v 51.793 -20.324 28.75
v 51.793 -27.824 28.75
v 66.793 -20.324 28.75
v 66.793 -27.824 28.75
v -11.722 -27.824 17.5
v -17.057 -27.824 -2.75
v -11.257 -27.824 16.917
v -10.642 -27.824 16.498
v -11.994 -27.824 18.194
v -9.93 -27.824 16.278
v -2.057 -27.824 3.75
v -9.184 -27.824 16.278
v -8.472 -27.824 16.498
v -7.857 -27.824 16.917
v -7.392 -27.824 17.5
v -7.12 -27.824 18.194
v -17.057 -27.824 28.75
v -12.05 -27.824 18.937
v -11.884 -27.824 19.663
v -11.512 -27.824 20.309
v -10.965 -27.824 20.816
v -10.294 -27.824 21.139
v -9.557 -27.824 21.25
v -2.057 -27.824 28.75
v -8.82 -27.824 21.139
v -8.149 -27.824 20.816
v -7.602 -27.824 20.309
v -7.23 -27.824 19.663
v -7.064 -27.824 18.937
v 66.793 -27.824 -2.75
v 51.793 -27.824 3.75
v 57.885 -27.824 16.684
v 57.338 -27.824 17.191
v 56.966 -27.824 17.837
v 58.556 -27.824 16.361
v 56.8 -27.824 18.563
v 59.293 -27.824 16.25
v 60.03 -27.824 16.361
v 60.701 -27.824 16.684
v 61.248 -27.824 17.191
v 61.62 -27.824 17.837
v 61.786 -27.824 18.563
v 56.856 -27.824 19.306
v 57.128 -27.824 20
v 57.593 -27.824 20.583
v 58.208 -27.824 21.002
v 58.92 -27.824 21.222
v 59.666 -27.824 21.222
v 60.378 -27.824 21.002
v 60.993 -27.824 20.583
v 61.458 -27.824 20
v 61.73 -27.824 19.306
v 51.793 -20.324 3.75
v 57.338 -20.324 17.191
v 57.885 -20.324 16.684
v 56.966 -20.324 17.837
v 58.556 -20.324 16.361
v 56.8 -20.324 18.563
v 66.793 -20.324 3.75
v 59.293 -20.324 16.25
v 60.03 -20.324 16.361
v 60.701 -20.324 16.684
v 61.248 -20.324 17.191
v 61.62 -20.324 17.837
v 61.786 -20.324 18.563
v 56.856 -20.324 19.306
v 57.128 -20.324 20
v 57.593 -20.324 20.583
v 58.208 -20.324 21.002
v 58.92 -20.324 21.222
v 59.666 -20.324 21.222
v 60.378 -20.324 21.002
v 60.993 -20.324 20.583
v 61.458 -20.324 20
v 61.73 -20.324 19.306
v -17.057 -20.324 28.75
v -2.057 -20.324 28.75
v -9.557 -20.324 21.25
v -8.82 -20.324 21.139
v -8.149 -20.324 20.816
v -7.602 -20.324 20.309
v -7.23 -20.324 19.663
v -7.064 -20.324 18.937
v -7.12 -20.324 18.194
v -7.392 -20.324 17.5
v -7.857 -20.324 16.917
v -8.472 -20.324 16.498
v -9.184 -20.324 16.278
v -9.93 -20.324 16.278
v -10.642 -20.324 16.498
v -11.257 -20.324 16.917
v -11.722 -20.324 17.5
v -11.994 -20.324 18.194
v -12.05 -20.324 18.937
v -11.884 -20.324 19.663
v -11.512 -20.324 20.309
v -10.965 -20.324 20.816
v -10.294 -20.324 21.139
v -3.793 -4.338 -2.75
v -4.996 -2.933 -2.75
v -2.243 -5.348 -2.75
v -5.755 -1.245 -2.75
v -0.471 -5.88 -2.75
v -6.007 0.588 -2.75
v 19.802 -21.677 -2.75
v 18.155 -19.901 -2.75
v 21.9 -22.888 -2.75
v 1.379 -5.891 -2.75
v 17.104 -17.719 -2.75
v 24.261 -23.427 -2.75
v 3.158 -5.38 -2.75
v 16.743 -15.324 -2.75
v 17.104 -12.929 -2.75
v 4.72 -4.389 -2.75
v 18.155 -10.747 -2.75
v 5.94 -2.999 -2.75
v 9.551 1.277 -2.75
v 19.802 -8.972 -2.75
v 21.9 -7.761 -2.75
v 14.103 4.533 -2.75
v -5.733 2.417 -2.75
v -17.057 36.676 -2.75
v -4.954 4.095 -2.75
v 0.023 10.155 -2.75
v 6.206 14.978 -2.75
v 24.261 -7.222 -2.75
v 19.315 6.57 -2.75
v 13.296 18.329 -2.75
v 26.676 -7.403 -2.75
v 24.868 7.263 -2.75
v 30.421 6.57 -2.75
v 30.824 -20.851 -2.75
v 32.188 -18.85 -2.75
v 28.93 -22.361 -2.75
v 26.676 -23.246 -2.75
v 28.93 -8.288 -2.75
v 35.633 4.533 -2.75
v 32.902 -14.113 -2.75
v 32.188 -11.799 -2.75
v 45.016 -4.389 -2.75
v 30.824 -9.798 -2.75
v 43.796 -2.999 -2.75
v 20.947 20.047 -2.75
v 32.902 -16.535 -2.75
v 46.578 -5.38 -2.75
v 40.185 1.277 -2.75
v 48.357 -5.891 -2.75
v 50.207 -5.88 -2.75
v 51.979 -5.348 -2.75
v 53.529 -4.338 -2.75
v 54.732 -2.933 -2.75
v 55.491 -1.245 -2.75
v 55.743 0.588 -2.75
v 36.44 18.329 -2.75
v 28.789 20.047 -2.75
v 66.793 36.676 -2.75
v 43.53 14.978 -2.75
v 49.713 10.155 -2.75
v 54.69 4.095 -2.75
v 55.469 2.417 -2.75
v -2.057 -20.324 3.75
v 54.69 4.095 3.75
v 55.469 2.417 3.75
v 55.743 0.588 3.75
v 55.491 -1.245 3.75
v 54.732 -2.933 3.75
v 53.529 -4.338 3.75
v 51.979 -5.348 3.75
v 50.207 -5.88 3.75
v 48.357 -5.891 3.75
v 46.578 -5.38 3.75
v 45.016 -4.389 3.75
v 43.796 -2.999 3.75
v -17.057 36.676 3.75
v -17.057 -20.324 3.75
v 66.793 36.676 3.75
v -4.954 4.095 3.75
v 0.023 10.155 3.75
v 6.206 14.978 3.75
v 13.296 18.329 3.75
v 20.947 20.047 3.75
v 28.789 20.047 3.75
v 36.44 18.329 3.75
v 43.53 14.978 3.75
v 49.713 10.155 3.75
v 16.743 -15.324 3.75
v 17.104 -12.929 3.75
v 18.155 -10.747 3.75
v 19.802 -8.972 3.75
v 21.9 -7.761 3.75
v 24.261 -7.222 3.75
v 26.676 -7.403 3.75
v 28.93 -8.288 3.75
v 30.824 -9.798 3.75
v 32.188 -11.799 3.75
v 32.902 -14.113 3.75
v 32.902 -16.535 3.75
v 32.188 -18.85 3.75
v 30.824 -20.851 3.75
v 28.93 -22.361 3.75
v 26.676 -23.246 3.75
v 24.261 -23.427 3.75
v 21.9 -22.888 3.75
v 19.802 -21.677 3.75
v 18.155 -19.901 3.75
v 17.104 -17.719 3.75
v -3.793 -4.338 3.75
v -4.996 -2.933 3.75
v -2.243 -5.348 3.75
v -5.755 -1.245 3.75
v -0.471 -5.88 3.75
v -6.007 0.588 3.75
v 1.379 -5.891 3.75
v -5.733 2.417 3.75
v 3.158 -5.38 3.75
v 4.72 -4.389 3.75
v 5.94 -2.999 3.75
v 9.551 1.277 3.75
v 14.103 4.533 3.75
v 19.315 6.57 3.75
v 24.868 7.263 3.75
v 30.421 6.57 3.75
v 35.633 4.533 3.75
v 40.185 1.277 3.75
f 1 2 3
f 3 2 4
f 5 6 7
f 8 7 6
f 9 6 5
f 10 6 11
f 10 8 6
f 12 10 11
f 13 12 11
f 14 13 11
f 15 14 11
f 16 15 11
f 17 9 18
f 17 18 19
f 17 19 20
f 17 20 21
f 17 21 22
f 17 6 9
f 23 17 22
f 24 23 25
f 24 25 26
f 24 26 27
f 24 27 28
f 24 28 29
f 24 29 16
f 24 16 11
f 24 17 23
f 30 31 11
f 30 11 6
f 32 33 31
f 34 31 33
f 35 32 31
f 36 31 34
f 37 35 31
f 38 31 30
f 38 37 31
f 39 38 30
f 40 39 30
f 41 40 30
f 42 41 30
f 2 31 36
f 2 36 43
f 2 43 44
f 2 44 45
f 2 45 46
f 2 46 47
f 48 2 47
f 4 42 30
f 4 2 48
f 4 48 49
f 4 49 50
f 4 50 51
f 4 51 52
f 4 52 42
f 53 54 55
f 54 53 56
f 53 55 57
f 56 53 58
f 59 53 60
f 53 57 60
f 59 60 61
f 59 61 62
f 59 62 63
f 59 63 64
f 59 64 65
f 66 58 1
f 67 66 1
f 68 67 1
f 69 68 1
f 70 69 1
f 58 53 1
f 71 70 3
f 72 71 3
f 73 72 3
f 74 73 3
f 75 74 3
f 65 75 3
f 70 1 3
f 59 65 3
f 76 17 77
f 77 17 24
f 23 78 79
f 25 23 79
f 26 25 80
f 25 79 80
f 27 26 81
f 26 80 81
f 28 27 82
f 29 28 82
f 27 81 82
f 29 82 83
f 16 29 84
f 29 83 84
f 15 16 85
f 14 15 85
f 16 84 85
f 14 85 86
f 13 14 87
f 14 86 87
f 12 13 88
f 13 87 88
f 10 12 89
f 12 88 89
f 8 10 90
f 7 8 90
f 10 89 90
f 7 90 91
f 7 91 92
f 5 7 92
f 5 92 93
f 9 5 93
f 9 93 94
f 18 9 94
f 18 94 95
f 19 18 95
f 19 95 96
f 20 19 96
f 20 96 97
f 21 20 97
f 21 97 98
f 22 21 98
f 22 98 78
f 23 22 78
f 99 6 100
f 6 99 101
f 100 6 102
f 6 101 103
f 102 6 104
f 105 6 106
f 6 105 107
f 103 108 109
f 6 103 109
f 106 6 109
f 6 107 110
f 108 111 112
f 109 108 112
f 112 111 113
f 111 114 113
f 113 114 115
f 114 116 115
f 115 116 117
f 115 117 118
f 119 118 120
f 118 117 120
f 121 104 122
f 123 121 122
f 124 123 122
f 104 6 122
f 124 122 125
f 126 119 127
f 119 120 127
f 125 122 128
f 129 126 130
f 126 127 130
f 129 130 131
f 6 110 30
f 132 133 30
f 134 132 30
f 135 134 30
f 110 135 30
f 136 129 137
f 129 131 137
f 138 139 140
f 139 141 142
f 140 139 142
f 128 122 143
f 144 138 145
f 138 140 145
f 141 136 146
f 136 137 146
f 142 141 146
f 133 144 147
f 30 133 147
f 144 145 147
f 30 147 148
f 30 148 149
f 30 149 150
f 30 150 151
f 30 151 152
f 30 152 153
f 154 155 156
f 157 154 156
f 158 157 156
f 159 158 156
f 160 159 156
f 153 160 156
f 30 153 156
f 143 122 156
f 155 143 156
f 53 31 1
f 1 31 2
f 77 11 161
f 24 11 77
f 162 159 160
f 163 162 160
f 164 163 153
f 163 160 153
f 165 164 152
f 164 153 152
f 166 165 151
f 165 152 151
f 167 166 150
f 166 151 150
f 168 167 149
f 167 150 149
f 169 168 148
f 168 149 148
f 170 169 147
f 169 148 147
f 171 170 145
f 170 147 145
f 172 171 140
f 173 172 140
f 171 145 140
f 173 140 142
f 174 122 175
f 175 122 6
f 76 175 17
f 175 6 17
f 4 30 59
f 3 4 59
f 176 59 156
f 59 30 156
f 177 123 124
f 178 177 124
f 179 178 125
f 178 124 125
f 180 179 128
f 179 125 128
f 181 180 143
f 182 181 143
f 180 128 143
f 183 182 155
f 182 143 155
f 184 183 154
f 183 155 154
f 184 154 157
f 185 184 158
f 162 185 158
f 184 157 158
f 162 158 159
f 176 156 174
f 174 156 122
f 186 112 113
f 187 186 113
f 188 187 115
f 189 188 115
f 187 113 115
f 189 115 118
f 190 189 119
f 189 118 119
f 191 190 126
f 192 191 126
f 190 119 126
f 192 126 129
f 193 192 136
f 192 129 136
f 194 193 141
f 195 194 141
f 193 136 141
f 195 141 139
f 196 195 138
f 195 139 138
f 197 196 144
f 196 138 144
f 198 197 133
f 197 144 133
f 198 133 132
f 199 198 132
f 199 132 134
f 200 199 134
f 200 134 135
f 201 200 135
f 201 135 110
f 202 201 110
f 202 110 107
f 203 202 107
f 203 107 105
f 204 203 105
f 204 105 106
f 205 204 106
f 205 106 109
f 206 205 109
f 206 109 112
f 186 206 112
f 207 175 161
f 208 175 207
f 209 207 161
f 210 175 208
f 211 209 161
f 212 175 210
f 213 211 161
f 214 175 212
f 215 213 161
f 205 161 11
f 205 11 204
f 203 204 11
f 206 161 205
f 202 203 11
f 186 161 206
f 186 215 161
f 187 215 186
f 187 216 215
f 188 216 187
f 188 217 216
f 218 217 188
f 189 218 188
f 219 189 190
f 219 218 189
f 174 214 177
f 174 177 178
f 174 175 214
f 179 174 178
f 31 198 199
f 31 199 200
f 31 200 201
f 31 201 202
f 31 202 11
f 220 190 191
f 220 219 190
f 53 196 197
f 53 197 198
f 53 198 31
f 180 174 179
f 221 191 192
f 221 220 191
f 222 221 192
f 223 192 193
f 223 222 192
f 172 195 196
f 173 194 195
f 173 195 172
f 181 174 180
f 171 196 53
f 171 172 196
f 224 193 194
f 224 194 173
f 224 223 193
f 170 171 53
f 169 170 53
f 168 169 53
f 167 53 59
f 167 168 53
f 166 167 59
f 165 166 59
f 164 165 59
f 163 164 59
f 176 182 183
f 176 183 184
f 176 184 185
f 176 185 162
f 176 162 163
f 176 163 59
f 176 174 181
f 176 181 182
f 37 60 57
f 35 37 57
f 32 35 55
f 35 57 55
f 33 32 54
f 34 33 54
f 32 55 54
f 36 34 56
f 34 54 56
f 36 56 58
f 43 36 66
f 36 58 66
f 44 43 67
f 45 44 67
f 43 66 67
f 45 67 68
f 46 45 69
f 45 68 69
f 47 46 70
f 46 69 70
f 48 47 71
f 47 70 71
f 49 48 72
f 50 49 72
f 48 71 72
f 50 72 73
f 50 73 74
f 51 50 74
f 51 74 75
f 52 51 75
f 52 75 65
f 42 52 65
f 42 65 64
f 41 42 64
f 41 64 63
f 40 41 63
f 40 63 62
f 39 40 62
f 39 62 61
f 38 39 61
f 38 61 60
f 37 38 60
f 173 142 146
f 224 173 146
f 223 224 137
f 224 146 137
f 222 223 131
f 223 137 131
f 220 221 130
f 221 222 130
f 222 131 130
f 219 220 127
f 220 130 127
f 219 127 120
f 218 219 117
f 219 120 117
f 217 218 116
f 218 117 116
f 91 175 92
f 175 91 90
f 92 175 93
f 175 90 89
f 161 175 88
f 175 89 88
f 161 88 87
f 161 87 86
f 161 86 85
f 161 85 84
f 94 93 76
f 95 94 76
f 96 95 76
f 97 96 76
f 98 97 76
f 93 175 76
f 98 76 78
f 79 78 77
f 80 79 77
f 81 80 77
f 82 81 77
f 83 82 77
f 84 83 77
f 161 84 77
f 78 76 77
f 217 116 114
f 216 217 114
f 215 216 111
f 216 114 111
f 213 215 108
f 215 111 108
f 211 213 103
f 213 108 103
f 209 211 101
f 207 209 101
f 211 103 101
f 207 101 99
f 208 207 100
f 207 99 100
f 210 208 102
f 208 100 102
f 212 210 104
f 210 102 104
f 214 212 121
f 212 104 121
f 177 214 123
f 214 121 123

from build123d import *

# Parameters (mm, degrees)
BOSS_EXTRU_1_DEPTH      = 1
ESQUISSE3_R             = 1.25
ENL_V_MAT_EXTRU_1_DEPTH = 3.45
ENL_V_MAT_EXTRU_2_DEPTH = 3.45
SCALE1_SCALE            = 6.5
CUT_EXTRUDE1_DEPTH      = 86.932976581
CUT_EXTRUDE1_DEPTH_BACK = 86.932976581
SKETCH2_W               = 15
SKETCH2_H               = 25
BOSS_EXTRUDE1_DEPTH     = 7.5
SKETCH3_R               = 2.5
CUT_EXTRUDE3_DEPTH      = 93.395152617


with BuildPart() as part:
    # Esquisse1 → Boss.-Extru.1 (new body)
    with BuildSketch(Plane.XY):
        Polygon((15.875, -11.8), (17.7, -11.8), (17.7, 0), (13.225, 0), (9.275, 0), (0, 0), (0, -11.8), (6.625, -11.8), (6.625, -13.9), (15.875, -13.9), align=None)
    extrude(amount=BOSS_EXTRU_1_DEPTH)

    # Esquisse3 → Enlèv. mat.-Extru.1 (cut)
    with BuildSketch(Plane(origin=(0, 0, 0), x_dir=(-1, 0, 0), z_dir=(0, 0, -1))):
        with Locations((-11.25, -8)):
            Circle(ESQUISSE3_R)
    extrude(amount=-ENL_V_MAT_EXTRU_1_DEPTH, mode=Mode.SUBTRACT)

    # Esquisse5 → Enlèv. mat.-Extru.2 (cut)
    with BuildSketch(Plane(origin=(0, 0, 0), x_dir=(-1, 0, 0), z_dir=(0, 0, -1))):
        with BuildLine():
            ThreePointArc((-6.662011173, -5.012361547), (-11.25, -2.525), (-15.837988827, -5.012361547))
            ThreePointArc((-15.837988827, -5.012361547), (-15.545687389, -6.396037763), (-14.162011173, -6.103736324))
            ThreePointArc((-14.162011173, -6.103736324), (-11.25, -4.525), (-8.337988827, -6.103736324))
            ThreePointArc((-8.337988827, -6.103736324), (-6.954312611, -6.396037763), (-6.662011173, -5.012361547))
        make_face()
    extrude(amount=-ENL_V_MAT_EXTRU_2_DEPTH, mode=Mode.SUBTRACT)


with BuildPart() as part_1:
    # Scale1: scaled about (8.774004249, -6.668318819, 0.5)
    add(part.part.scale(SCALE1_SCALE).moved(Location((-48.25702337, 36.675753504, -2.75))))

    # Sketch1 → Cut-Extrude1 (cut, two sides: drawn at the far end of the back side and taken through both)
    with BuildSketch(Plane(origin=(0, 0, -2.75), x_dir=(-1, 0, 0), z_dir=(0, 0, -1)).offset(-CUT_EXTRUDE1_DEPTH_BACK)):
        Polygon((-66.79297663, -27.824246495), (17.05702337, -27.824246495), (17.05702337, 36.675753505), (48.25702337, 36.675753505), (48.25702337, -27.824246495), (48.25702337, -58.098552113), (-66.79297663, -58.098552113), align=None)
    extrude(amount=CUT_EXTRUDE1_DEPTH + CUT_EXTRUDE1_DEPTH_BACK, mode=Mode.SUBTRACT)

    # Sketch2 → Boss-Extrude1 (add)
    with BuildSketch(Plane.XZ.offset(27.824246495)):
        with Locations((-9.55702337, 16.25)):
            Rectangle(SKETCH2_W, SKETCH2_H)
        with Locations((59.29297663, 16.25)):
            Rectangle(SKETCH2_W, SKETCH2_H)
    extrude(amount=-BOSS_EXTRUDE1_DEPTH)

    # Sketch3 → Cut-Extrude3 (cut, through all)
    with BuildSketch(Plane(origin=(0, -20.324246495, 0), x_dir=(1, 0, 0), z_dir=(0, 1, 0))):
        with Locations(Location((-9.55702337, -18.75, 0), (0, 0, 270))):
            Circle(SKETCH3_R)
        with Locations(Location((59.29297663, -18.75, 0), (0, 0, 90))):
            Circle(SKETCH3_R)
    extrude(amount=-CUT_EXTRUDE3_DEPTH, mode=Mode.SUBTRACT)


solid = part_1.part
